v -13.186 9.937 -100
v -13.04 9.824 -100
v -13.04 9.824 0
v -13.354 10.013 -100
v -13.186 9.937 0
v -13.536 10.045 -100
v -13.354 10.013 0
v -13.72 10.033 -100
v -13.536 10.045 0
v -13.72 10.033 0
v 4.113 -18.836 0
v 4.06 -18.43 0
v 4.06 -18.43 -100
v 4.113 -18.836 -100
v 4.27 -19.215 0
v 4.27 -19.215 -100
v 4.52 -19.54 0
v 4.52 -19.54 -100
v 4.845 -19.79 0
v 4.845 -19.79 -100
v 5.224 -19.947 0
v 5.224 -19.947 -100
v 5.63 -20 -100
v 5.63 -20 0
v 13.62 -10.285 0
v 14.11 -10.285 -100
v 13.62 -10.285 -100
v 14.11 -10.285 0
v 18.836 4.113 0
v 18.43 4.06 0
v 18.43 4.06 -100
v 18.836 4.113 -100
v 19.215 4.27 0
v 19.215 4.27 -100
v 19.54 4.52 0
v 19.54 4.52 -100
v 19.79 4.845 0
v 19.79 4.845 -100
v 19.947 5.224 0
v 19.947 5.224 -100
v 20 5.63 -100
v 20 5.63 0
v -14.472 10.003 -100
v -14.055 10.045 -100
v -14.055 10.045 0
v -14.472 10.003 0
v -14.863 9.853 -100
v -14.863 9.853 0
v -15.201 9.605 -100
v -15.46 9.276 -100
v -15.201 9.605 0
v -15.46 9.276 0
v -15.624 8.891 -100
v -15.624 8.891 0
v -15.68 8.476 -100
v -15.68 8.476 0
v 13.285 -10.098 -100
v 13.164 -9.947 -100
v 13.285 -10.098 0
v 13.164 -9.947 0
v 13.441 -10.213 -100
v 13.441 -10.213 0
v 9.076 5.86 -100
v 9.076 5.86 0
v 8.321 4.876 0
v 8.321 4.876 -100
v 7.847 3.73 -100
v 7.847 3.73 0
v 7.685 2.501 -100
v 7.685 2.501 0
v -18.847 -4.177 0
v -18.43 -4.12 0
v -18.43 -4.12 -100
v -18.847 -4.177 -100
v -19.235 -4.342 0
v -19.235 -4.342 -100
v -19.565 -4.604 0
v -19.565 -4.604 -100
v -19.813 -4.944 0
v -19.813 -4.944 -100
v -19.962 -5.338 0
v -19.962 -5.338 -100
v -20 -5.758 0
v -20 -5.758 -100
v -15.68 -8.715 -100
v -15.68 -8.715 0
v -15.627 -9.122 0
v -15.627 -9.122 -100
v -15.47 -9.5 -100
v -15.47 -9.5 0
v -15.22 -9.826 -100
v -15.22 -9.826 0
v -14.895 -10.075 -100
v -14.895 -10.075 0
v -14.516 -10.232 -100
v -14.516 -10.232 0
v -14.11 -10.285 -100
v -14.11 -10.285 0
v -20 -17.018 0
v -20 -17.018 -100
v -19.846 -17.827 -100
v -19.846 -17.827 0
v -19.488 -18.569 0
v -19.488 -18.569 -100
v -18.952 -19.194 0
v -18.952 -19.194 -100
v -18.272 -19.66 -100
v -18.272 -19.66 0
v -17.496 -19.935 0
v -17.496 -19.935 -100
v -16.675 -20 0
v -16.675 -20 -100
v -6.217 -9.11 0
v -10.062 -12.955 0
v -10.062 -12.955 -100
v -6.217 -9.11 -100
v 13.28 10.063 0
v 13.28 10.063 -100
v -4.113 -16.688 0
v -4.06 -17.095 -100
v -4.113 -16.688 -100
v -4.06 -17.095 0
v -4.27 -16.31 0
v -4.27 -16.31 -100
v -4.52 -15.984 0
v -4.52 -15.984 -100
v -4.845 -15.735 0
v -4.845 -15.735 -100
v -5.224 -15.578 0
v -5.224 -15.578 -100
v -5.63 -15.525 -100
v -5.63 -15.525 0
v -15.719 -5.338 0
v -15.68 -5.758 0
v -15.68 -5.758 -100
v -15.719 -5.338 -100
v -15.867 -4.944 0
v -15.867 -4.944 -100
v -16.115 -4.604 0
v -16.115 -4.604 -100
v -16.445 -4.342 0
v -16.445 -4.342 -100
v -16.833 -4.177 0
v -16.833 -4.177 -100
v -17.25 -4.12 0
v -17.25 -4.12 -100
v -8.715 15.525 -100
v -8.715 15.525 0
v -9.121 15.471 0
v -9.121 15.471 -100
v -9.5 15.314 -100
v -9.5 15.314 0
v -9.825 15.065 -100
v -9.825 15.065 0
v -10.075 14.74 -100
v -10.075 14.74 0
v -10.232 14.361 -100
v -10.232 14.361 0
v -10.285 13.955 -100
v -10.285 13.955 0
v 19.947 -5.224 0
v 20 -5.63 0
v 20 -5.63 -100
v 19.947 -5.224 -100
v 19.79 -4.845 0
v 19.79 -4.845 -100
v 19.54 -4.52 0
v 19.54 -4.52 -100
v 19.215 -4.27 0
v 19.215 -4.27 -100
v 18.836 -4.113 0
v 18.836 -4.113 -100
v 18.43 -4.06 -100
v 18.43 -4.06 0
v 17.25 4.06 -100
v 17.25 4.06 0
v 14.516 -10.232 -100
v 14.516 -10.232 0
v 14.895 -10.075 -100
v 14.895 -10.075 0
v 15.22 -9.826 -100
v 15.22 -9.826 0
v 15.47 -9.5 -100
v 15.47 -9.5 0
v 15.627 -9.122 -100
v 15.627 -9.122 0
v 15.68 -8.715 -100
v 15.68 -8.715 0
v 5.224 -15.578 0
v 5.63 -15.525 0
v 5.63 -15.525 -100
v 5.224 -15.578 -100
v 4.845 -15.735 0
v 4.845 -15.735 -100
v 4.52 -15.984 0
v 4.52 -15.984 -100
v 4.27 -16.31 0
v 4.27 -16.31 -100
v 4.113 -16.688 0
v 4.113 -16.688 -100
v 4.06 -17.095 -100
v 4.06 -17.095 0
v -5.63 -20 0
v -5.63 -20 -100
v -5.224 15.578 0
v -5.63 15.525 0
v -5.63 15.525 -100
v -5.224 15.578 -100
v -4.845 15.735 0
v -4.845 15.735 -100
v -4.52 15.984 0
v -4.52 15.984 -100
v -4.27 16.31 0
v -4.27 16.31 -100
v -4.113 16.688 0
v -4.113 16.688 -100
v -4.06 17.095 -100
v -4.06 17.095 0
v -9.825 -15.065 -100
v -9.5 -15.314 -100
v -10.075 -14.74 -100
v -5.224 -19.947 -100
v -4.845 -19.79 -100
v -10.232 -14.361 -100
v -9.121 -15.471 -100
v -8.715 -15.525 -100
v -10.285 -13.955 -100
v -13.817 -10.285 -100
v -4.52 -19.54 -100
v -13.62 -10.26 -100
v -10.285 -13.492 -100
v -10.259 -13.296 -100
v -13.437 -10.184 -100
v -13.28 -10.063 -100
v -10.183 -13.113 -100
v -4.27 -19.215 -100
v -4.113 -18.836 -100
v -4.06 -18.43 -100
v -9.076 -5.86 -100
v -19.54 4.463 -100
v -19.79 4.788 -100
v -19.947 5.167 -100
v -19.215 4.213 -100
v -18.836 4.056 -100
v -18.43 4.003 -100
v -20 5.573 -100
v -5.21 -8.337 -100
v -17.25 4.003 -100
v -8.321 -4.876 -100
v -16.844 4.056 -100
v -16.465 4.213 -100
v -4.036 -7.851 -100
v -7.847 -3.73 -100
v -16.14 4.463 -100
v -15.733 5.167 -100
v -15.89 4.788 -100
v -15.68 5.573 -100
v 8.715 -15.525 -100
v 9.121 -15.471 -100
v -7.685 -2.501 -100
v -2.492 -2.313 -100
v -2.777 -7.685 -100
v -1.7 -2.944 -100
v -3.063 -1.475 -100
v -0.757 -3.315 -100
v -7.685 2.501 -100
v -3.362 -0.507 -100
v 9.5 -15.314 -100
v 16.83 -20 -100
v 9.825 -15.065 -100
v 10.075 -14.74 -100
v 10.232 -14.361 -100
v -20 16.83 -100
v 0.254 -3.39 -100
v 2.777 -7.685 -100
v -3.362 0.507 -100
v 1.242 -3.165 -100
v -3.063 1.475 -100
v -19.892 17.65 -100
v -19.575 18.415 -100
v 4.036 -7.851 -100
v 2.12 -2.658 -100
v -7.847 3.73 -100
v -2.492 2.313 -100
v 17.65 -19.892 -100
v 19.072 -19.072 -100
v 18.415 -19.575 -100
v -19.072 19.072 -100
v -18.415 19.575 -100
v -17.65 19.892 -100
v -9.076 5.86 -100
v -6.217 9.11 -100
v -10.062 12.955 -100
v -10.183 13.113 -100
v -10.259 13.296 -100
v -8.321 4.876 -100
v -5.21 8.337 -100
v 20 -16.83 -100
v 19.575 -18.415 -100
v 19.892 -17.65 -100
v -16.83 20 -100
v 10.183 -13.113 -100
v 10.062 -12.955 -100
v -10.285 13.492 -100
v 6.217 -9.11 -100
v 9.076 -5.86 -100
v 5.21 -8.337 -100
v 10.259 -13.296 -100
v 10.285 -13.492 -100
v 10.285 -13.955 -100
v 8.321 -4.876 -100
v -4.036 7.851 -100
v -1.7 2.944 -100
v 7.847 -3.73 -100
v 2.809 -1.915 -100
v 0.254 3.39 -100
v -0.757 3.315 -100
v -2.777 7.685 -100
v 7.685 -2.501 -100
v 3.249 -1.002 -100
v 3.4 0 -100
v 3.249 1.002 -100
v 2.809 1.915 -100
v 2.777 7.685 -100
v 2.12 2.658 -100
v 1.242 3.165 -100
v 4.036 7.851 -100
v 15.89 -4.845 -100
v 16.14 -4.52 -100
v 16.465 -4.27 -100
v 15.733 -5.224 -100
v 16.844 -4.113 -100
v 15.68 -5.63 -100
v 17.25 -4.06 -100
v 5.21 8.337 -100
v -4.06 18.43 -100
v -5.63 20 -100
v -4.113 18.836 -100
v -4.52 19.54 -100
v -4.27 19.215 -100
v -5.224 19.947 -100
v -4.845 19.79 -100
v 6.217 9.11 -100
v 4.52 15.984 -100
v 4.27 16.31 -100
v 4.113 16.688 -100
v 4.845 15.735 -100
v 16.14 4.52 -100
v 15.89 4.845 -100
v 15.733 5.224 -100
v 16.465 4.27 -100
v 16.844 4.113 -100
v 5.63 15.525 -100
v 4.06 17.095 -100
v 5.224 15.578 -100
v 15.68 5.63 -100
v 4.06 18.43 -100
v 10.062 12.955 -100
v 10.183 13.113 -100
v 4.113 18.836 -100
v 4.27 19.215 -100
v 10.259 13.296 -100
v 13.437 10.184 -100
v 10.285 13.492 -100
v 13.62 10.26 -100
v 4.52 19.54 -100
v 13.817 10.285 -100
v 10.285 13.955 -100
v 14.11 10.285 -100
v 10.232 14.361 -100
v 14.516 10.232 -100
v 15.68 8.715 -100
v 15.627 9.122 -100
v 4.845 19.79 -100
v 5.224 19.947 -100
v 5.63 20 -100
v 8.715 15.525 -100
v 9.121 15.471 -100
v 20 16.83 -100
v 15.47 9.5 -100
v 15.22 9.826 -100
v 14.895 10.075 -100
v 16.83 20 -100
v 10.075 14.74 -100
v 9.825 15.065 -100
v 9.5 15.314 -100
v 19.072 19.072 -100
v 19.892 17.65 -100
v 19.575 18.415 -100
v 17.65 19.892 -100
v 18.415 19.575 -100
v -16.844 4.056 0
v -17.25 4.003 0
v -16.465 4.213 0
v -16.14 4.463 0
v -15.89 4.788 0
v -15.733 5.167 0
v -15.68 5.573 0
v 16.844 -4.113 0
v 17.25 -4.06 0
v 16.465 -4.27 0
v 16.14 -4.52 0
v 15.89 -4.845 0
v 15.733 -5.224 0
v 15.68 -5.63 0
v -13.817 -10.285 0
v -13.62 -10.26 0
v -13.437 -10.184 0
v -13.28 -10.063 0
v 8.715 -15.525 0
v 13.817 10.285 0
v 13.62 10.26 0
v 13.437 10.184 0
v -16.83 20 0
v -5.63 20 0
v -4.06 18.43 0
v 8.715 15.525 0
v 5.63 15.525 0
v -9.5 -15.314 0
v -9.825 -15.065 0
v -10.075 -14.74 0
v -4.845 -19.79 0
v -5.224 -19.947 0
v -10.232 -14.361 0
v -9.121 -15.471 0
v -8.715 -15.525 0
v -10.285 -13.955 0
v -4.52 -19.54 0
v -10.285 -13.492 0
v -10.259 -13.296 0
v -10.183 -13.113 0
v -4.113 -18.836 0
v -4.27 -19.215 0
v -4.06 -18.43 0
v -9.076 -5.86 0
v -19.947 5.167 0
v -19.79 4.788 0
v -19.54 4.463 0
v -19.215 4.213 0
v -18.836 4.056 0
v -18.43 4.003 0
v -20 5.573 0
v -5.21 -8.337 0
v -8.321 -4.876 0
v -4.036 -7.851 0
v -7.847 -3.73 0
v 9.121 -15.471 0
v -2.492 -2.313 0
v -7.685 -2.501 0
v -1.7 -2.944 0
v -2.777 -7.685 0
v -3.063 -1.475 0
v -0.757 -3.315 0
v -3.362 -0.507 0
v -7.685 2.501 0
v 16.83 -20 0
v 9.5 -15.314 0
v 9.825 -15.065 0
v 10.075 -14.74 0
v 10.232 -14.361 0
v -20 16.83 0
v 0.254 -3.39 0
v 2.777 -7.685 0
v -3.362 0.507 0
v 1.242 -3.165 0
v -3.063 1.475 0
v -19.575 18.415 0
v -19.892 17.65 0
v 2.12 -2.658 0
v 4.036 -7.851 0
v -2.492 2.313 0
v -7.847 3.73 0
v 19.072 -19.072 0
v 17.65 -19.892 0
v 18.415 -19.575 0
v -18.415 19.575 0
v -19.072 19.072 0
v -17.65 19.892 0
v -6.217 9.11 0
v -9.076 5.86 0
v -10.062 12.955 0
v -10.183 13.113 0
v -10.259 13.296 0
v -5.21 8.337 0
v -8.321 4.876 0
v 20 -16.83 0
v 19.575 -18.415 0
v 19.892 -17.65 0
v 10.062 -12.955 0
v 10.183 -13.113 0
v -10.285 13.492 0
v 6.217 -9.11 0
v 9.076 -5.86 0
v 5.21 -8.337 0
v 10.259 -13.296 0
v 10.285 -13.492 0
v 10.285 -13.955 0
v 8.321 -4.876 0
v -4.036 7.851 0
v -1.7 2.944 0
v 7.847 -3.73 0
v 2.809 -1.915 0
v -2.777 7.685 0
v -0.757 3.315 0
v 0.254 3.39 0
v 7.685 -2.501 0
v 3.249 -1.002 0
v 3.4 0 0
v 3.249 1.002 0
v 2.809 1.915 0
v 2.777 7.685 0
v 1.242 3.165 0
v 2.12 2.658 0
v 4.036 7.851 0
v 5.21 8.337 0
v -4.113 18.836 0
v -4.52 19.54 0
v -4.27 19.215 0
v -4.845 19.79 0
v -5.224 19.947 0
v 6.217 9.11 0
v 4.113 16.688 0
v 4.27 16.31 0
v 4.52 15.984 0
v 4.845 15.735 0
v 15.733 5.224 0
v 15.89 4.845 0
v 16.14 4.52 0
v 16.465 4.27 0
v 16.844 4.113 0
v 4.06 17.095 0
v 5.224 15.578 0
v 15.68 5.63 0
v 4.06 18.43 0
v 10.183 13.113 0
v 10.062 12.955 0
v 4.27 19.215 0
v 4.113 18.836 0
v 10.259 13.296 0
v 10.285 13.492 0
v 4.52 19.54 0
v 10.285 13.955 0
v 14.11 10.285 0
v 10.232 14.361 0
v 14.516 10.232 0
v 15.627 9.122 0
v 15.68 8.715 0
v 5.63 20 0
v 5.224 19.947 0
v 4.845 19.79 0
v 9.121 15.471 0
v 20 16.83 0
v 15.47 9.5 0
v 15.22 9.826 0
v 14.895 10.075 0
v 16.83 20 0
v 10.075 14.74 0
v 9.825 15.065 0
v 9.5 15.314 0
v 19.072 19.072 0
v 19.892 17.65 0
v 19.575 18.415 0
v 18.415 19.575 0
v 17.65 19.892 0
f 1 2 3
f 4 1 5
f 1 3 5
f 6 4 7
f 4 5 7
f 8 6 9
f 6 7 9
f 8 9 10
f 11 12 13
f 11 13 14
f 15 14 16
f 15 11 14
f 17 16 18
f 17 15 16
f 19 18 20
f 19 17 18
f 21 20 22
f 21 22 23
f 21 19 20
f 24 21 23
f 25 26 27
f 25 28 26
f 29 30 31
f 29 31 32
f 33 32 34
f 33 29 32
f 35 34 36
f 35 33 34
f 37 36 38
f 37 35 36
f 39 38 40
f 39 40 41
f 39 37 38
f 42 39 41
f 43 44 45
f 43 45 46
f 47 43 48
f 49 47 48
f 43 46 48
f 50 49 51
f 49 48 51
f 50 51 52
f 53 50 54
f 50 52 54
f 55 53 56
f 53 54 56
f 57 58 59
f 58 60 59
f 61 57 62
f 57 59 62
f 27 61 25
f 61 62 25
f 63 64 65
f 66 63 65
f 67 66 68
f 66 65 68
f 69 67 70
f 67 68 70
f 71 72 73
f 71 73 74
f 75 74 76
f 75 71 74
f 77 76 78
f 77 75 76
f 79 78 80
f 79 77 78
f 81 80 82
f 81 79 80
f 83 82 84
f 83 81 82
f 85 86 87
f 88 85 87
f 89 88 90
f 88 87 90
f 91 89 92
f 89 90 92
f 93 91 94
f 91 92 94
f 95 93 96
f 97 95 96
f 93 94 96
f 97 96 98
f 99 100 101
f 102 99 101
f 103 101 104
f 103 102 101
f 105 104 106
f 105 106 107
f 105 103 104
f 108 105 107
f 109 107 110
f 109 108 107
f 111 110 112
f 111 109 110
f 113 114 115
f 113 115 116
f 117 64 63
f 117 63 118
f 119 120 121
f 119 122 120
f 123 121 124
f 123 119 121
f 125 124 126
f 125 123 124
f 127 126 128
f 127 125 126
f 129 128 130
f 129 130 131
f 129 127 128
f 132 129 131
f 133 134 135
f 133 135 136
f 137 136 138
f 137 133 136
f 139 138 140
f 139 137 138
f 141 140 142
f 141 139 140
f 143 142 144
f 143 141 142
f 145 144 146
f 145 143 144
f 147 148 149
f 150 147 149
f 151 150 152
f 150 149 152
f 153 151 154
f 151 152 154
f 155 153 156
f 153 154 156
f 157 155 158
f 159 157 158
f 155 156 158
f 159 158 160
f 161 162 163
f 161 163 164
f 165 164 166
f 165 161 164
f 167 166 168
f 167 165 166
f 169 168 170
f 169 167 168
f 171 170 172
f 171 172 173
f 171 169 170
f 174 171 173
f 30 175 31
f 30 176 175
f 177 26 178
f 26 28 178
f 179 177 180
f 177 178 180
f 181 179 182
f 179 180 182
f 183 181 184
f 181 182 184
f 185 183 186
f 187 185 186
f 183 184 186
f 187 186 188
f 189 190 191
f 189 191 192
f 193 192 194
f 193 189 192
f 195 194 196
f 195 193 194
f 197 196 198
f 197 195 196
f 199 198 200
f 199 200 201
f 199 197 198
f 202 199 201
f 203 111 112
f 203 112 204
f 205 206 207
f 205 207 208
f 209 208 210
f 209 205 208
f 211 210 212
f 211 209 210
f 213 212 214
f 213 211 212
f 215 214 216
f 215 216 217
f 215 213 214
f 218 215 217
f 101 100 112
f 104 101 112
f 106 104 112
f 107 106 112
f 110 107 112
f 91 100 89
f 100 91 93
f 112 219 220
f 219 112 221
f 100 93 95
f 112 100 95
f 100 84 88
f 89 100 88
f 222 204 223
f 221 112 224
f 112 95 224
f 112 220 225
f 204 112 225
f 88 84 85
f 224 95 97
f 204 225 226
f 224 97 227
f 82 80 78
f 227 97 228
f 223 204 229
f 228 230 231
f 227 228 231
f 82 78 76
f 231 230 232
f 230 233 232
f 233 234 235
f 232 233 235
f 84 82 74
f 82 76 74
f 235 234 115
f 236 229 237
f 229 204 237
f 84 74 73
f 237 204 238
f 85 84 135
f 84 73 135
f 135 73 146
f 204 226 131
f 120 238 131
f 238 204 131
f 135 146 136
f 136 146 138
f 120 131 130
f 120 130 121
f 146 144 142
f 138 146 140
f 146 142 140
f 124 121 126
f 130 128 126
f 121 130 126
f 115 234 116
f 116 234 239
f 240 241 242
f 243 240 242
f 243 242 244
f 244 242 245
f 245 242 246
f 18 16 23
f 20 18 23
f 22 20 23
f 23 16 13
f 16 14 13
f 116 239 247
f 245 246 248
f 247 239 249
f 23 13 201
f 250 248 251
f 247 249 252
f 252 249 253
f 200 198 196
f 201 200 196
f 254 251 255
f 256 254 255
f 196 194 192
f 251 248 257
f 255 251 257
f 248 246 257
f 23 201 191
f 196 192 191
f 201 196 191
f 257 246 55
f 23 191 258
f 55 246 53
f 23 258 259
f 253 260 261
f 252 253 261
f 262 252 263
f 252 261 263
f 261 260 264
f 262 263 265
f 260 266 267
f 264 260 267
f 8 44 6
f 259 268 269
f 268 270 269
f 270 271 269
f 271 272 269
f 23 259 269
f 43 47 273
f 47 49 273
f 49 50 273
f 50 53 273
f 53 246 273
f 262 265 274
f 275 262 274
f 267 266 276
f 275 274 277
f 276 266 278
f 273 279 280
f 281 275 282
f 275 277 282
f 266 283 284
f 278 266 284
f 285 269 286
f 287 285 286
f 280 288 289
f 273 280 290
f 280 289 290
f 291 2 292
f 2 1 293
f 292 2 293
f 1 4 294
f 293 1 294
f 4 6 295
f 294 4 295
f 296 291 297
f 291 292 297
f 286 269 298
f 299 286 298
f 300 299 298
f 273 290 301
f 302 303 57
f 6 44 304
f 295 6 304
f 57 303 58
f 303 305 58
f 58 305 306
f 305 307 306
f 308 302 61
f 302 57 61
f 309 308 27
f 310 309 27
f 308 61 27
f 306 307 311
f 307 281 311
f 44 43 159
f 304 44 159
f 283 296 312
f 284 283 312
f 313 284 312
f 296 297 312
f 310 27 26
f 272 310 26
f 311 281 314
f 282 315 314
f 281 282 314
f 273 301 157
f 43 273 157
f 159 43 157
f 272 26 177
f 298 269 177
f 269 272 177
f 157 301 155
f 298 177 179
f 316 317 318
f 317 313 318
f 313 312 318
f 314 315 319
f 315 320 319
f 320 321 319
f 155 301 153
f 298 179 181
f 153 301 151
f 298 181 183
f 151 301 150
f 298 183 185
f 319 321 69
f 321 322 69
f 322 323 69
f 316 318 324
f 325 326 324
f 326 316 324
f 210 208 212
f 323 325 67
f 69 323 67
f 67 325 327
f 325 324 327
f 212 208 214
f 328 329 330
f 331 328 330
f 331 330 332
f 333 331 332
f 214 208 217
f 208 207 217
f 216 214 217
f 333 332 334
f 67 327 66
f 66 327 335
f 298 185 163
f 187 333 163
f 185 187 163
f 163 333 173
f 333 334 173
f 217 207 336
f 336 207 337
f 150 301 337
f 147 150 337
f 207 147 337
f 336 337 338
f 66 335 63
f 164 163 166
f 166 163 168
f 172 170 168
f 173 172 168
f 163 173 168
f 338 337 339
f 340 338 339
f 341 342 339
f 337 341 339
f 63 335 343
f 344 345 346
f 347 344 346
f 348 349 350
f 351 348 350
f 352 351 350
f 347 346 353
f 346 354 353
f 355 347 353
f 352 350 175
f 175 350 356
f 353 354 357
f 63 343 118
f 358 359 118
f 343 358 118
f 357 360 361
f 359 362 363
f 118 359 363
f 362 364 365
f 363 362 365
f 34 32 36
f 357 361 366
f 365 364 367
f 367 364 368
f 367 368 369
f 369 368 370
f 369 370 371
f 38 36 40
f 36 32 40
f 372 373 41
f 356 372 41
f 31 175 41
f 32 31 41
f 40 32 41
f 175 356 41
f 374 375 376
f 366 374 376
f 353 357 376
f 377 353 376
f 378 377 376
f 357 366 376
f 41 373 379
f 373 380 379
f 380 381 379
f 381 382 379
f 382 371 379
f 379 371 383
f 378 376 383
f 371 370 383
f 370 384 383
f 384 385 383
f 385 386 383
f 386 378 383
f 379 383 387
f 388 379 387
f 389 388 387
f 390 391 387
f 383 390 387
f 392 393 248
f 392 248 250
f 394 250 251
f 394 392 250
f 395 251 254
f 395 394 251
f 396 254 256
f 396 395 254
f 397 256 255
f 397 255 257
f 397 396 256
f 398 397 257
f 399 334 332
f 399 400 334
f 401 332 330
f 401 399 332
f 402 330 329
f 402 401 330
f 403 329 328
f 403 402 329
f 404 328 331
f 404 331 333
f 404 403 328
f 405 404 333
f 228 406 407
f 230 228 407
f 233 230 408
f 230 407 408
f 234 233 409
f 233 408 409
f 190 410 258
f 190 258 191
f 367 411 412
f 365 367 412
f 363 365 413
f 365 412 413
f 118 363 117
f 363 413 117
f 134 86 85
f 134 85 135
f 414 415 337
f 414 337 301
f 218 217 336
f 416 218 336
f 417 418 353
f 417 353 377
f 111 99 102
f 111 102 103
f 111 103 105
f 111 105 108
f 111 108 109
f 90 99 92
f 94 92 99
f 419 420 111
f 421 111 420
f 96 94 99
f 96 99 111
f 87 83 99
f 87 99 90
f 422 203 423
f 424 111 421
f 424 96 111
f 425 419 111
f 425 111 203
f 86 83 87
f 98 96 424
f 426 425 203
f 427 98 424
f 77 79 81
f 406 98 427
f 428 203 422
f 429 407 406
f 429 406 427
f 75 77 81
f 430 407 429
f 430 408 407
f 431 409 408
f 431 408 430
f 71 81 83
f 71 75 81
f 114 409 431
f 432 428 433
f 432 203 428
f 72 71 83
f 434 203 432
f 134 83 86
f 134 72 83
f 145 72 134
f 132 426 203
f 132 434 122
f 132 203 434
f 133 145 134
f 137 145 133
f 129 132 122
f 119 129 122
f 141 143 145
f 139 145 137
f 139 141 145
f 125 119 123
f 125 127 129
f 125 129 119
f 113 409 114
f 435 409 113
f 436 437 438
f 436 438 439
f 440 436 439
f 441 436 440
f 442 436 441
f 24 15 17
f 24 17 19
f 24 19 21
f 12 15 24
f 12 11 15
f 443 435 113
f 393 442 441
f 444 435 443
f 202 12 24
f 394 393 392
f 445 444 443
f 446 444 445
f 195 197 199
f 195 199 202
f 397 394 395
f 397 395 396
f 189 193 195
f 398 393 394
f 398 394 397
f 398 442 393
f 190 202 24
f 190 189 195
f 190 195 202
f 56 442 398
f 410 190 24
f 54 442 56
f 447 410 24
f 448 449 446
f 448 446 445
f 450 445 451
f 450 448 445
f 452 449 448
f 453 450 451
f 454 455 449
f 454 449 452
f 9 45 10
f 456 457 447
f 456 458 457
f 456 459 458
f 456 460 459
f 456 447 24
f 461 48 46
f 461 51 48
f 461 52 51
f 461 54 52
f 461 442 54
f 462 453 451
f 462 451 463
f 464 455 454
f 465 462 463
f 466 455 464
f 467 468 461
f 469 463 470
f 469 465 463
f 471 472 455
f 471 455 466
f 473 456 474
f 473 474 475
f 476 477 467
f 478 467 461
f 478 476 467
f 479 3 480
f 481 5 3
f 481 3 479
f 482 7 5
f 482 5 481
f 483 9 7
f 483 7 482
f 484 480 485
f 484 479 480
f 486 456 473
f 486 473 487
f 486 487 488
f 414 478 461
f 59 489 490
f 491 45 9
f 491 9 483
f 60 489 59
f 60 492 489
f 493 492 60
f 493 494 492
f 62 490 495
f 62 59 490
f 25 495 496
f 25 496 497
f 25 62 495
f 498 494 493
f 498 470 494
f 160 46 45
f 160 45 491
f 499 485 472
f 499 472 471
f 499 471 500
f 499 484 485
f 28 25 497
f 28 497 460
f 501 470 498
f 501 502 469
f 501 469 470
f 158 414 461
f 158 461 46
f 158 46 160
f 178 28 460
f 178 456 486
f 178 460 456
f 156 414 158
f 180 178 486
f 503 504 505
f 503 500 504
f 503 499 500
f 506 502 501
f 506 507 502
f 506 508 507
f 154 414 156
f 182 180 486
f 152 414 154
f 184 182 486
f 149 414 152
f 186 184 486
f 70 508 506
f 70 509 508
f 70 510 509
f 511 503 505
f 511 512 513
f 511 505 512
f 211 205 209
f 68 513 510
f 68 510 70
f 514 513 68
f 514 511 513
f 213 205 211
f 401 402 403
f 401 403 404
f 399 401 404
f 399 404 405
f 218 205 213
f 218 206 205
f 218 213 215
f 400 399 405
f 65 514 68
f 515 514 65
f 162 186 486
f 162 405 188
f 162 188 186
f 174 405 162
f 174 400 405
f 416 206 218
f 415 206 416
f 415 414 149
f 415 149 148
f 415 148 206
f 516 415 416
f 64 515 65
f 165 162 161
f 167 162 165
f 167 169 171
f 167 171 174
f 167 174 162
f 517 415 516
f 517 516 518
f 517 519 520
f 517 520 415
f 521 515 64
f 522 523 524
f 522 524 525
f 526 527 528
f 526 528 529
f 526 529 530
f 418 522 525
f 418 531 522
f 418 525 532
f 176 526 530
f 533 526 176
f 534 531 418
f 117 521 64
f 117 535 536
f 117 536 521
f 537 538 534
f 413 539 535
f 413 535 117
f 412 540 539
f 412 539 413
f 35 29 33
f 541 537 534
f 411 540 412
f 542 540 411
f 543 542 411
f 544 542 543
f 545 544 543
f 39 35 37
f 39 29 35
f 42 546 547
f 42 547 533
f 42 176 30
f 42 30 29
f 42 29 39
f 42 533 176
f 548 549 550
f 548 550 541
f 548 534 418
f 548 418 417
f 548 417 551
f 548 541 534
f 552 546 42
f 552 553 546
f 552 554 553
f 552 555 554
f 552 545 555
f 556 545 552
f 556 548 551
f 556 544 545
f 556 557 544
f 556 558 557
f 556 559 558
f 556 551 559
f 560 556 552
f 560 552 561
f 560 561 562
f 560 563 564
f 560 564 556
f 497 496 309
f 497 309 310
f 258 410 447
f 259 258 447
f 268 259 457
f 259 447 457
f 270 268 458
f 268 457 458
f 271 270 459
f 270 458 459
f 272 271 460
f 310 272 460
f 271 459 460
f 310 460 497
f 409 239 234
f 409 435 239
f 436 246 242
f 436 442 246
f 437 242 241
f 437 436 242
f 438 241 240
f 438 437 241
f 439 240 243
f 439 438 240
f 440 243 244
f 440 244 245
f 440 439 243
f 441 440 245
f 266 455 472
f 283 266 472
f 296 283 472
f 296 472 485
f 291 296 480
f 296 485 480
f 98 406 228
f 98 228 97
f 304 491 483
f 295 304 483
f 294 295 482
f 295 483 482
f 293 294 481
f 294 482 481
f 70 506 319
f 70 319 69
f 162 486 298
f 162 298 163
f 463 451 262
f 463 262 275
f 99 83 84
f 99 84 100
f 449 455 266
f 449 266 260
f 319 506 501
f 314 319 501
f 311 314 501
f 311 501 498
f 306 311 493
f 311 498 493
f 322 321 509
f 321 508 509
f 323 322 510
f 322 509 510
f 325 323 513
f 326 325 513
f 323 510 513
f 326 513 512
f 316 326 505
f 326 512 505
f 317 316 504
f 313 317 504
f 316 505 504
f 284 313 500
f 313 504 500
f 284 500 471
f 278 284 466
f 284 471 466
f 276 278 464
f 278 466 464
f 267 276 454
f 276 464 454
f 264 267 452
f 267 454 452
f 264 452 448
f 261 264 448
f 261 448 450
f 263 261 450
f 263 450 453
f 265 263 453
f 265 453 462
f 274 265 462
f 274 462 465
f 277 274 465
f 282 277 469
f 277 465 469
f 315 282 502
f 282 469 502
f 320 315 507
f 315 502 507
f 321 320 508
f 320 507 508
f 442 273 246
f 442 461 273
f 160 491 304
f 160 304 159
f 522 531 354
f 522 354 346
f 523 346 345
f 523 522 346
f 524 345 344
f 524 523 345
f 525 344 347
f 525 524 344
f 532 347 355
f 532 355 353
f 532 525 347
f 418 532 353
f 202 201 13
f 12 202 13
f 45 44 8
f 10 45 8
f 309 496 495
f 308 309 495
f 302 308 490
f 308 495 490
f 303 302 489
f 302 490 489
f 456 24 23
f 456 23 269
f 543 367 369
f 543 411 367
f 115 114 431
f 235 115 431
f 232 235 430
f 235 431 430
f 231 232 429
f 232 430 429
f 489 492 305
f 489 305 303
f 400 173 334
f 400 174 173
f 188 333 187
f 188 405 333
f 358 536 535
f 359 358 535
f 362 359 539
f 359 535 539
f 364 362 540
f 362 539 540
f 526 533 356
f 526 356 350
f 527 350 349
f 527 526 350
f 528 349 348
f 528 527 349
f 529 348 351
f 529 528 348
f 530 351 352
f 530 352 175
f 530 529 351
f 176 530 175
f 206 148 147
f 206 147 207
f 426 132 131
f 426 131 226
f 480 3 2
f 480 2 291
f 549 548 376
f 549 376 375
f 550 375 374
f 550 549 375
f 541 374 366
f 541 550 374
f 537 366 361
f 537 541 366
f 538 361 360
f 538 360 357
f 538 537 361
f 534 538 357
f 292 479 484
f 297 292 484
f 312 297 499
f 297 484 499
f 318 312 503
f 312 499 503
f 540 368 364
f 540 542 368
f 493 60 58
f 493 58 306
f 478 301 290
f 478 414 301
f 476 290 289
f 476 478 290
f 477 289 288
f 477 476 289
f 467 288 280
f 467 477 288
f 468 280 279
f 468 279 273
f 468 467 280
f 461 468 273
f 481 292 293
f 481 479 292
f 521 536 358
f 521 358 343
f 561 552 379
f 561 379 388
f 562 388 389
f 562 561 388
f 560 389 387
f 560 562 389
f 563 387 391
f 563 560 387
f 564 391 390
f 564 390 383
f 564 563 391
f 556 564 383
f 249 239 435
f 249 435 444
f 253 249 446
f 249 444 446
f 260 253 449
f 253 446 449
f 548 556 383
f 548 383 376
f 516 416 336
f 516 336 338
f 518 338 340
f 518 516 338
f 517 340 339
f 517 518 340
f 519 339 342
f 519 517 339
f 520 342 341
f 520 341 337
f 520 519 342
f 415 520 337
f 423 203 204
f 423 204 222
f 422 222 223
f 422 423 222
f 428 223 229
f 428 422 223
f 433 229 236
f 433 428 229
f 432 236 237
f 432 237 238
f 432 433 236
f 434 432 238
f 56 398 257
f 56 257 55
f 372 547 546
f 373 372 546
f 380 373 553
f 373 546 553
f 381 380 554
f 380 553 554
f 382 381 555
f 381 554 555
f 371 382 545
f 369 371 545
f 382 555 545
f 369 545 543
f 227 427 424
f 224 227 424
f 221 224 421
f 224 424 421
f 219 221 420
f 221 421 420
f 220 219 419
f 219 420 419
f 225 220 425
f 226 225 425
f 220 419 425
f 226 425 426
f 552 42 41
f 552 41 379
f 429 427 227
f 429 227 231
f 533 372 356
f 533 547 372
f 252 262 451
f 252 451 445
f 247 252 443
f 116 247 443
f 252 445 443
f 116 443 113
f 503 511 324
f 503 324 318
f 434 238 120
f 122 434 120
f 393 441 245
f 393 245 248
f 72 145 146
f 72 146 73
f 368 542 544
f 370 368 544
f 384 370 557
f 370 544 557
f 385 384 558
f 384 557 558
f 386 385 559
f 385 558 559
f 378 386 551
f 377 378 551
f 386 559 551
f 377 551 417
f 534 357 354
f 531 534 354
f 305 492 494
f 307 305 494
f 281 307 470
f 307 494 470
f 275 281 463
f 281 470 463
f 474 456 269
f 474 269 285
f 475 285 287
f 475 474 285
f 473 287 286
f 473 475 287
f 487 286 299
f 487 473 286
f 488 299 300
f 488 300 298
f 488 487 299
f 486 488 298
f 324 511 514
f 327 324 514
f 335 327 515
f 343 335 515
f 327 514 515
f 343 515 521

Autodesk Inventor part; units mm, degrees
ref_plane "YZ Plane" through (0, 0, 0) normal (1, 0, 0) x (0, 1, 0)
ref_plane "XZ Plane" through (0, 0, 0) normal (0, 1, 0) x (-1, 0, 0)
ref_plane "XY Plane" through (0, 0, 0) normal (0, 0, 1) x (1, 0, 0)
sketch "Sketch1" plane through (0, 0, 0) normal (0, 0, 1) x (1, 0, 0)
  circle A0 centre (0, 0) radius 3.4
  arc A1 (-4.06, -17.0946) -> (-5.63, -15.5246) centre (-5.63, -17.0946) ccw
  line L0 (-5.63, -15.5246) -> (-8.715, -15.5246)
  arc A2 (-10.285, -13.9546) -> (-8.715, -15.5246) centre (-8.715, -13.9546) ccw
  line L1 (-10.285, -13.9546) -> (-10.285, -13.4925)
  arc A3 (-10.0624, -12.9551) -> (-10.285, -13.4925) centre (-9.525, -13.4925) ccw
  line L2 (-10.0624, -12.9551) -> (-6.2171, -9.1098)
  arc A4 (-2.7773, -7.685) -> (-6.2171, -9.1098) centre (-2.7773, -12.5496) ccw
  line L3 (-2.7773, -7.685) -> (2.7773, -7.685)
  arc A5 (6.2171, -9.1098) -> (2.7773, -7.685) centre (2.7773, -12.5496) ccw
  line L4 (6.2171, -9.1098) -> (10.0624, -12.9551)
  arc A6 (10.285, -13.4925) -> (10.0624, -12.9551) centre (9.525, -13.4925) ccw
  line L5 (10.285, -13.4925) -> (10.285, -13.9546)
  arc A7 (8.715, -15.5246) -> (10.285, -13.9546) centre (8.715, -13.9546) ccw
  line L6 (8.715, -15.5246) -> (5.63, -15.5246)
  arc A8 (5.63, -15.5246) -> (4.06, -17.0946) centre (5.63, -17.0946) ccw
  line L7 (4.06, -17.0946) -> (4.06, -18.43)
  arc A9 (4.06, -18.43) -> (5.63, -20) centre (5.63, -18.43) ccw
  line L8 (5.63, -20) -> (16.83, -20)
  arc A10 (16.83, -20) -> (20, -16.83) centre (16.83, -16.83) ccw
  line L9 (20, -16.83) -> (20, -5.63)
  arc A11 (20, -5.63) -> (18.43, -4.06) centre (18.43, -5.63) ccw
  line L10 (18.43, -4.06) -> (17.25, -4.06)
  arc A12 (17.25, -4.06) -> (15.68, -5.63) centre (17.25, -5.63) ccw
  line L11 (15.68, -5.63) -> (15.68, -8.7154)
  arc A13 (14.11, -10.2854) -> (15.68, -8.7154) centre (14.11, -8.7154) ccw
  line L12 (14.11, -10.2854) -> (13.6201, -10.2854)
  arc A14 (13.1637, -9.947) -> (13.6201, -10.2854) centre (13.8117, -9.55) ccw
  line L13 (13.1637, -9.947) -> (9.0762, -5.8595)
  arc A15 (7.685, -2.5008) -> (9.0762, -5.8595) centre (12.435, -2.5008) ccw
  line L14 (7.685, -2.5008) -> (7.685, 2.5008)
  arc A16 (9.0762, 5.8595) -> (7.685, 2.5008) centre (12.435, 2.5008) ccw
  line L15 (9.0762, 5.8595) -> (13.2795, 10.0628)
  arc A17 (13.8169, 10.2854) -> (13.2795, 10.0628) centre (13.8169, 9.5254) ccw
  line L16 (13.8169, 10.2854) -> (14.11, 10.2854)
  arc A18 (15.68, 8.7154) -> (14.11, 10.2854) centre (14.11, 8.7154) ccw
  line L17 (15.68, 8.7154) -> (15.68, 5.63)
  arc A19 (15.68, 5.63) -> (17.25, 4.06) centre (17.25, 5.63) ccw
  line L18 (17.25, 4.06) -> (18.43, 4.06)
  arc A20 (18.43, 4.06) -> (20, 5.63) centre (18.43, 5.63) ccw
  line L19 (20, 5.63) -> (20, 16.83)
  arc A21 (20, 16.83) -> (16.83, 20) centre (16.83, 16.83) ccw
  line L20 (16.83, 20) -> (5.63, 20)
  arc A22 (5.63, 20) -> (4.06, 18.43) centre (5.63, 18.43) ccw
  line L21 (4.06, 18.43) -> (4.06, 17.0946)
  arc A23 (4.06, 17.0946) -> (5.63, 15.5246) centre (5.63, 17.0946) ccw
  line L22 (5.63, 15.5246) -> (8.715, 15.5246)
  arc A24 (10.285, 13.9546) -> (8.715, 15.5246) centre (8.715, 13.9546) ccw
  line L23 (10.285, 13.9546) -> (10.285, 13.4925)
  arc A25 (10.0624, 12.9551) -> (10.285, 13.4925) centre (9.525, 13.4925) ccw
  line L24 (10.0624, 12.9551) -> (6.2171, 9.1098)
  arc A26 (2.7773, 7.685) -> (6.2171, 9.1098) centre (2.7773, 12.5496) ccw
  line L25 (2.7773, 7.685) -> (-2.7773, 7.685)
  arc A27 (-6.2171, 9.1098) -> (-2.7773, 7.685) centre (-2.7773, 12.5496) ccw
  line L26 (-6.2171, 9.1098) -> (-10.0624, 12.9551)
  arc A28 (-10.285, 13.4925) -> (-10.0624, 12.9551) centre (-9.525, 13.4925) ccw
  line L27 (-10.285, 13.4925) -> (-10.285, 13.9546)
  arc A29 (-8.715, 15.5246) -> (-10.285, 13.9546) centre (-8.715, 13.9546) ccw
  line L28 (-8.715, 15.5246) -> (-5.63, 15.5246)
  arc A30 (-5.63, 15.5246) -> (-4.06, 17.0946) centre (-5.63, 17.0946) ccw
  line L29 (-4.06, 17.0946) -> (-4.06, 18.43)
  arc A31 (-4.06, 18.43) -> (-5.63, 20) centre (-5.63, 18.43) ccw
  line L30 (-5.63, 20) -> (-16.83, 20)
  arc A32 (-16.83, 20) -> (-20, 16.83) centre (-16.83, 16.83) ccw
  line L31 (-20, 16.83) -> (-20, 5.573)
  arc A33 (-20, 5.573) -> (-18.43, 4.003) centre (-18.43, 5.573) ccw
  line L32 (-18.43, 4.003) -> (-17.25, 4.003)
  arc A34 (-17.25, 4.003) -> (-15.68, 5.573) centre (-17.25, 5.573) ccw
  line L33 (-15.68, 5.573) -> (-15.68, 8.4757)
  arc A35 (-14.0552, 10.0447) -> (-15.68, 8.4757) centre (-14.11, 8.4757) ccw
  line L34 (-14.0552, 10.0447) -> (-13.7199, 10.033)
  arc A36 (-13.0405, 9.8238) -> (-13.7199, 10.033) centre (-13.5779, 9.2864) ccw
  line L35 (-13.0405, 9.8238) -> (-9.0762, 5.8595)
  arc A37 (-7.685, 2.5008) -> (-9.0762, 5.8595) centre (-12.435, 2.5008) ccw
  line L36 (-7.685, 2.5008) -> (-7.685, -2.5008)
  arc A38 (-9.0762, -5.8595) -> (-7.685, -2.5008) centre (-12.435, -2.5008) ccw
  line L37 (-9.0762, -5.8595) -> (-13.2795, -10.0628)
  arc A39 (-13.8169, -10.2854) -> (-13.2795, -10.0628) centre (-13.8169, -9.5254) ccw
  line L38 (-13.8169, -10.2854) -> (-14.11, -10.2854)
  arc A40 (-15.68, -8.7154) -> (-14.11, -10.2854) centre (-14.11, -8.7154) ccw
  line L39 (-15.68, -8.7154) -> (-15.68, -5.7579)
  arc A41 (-15.68, -5.7579) -> (-17.25, -4.1204) centre (-17.2485, -5.6904) ccw
  line L40 (-17.25, -4.1204) -> (-18.43, -4.1204)
  arc A42 (-18.43, -4.1204) -> (-20, -5.7579) centre (-18.4315, -5.6904) ccw
  line L41 (-20, -5.7579) -> (-20, -17.0184)
  arc A43 (-20, -17.0184) -> (-16.6746, -20) centre (-16.8354, -16.8341) ccw
  line L42 (-16.6746, -20) -> (-5.63, -20)
  arc A44 (-5.63, -20) -> (-4.06, -18.43) centre (-5.63, -18.43) ccw
  line L43 (-4.06, -18.43) -> (-4.06, -17.0946)
extrude "Extrusion1" add sketch "Sketch1" against normal blind 100
properties part number "40-4040-BLACK-FB"
